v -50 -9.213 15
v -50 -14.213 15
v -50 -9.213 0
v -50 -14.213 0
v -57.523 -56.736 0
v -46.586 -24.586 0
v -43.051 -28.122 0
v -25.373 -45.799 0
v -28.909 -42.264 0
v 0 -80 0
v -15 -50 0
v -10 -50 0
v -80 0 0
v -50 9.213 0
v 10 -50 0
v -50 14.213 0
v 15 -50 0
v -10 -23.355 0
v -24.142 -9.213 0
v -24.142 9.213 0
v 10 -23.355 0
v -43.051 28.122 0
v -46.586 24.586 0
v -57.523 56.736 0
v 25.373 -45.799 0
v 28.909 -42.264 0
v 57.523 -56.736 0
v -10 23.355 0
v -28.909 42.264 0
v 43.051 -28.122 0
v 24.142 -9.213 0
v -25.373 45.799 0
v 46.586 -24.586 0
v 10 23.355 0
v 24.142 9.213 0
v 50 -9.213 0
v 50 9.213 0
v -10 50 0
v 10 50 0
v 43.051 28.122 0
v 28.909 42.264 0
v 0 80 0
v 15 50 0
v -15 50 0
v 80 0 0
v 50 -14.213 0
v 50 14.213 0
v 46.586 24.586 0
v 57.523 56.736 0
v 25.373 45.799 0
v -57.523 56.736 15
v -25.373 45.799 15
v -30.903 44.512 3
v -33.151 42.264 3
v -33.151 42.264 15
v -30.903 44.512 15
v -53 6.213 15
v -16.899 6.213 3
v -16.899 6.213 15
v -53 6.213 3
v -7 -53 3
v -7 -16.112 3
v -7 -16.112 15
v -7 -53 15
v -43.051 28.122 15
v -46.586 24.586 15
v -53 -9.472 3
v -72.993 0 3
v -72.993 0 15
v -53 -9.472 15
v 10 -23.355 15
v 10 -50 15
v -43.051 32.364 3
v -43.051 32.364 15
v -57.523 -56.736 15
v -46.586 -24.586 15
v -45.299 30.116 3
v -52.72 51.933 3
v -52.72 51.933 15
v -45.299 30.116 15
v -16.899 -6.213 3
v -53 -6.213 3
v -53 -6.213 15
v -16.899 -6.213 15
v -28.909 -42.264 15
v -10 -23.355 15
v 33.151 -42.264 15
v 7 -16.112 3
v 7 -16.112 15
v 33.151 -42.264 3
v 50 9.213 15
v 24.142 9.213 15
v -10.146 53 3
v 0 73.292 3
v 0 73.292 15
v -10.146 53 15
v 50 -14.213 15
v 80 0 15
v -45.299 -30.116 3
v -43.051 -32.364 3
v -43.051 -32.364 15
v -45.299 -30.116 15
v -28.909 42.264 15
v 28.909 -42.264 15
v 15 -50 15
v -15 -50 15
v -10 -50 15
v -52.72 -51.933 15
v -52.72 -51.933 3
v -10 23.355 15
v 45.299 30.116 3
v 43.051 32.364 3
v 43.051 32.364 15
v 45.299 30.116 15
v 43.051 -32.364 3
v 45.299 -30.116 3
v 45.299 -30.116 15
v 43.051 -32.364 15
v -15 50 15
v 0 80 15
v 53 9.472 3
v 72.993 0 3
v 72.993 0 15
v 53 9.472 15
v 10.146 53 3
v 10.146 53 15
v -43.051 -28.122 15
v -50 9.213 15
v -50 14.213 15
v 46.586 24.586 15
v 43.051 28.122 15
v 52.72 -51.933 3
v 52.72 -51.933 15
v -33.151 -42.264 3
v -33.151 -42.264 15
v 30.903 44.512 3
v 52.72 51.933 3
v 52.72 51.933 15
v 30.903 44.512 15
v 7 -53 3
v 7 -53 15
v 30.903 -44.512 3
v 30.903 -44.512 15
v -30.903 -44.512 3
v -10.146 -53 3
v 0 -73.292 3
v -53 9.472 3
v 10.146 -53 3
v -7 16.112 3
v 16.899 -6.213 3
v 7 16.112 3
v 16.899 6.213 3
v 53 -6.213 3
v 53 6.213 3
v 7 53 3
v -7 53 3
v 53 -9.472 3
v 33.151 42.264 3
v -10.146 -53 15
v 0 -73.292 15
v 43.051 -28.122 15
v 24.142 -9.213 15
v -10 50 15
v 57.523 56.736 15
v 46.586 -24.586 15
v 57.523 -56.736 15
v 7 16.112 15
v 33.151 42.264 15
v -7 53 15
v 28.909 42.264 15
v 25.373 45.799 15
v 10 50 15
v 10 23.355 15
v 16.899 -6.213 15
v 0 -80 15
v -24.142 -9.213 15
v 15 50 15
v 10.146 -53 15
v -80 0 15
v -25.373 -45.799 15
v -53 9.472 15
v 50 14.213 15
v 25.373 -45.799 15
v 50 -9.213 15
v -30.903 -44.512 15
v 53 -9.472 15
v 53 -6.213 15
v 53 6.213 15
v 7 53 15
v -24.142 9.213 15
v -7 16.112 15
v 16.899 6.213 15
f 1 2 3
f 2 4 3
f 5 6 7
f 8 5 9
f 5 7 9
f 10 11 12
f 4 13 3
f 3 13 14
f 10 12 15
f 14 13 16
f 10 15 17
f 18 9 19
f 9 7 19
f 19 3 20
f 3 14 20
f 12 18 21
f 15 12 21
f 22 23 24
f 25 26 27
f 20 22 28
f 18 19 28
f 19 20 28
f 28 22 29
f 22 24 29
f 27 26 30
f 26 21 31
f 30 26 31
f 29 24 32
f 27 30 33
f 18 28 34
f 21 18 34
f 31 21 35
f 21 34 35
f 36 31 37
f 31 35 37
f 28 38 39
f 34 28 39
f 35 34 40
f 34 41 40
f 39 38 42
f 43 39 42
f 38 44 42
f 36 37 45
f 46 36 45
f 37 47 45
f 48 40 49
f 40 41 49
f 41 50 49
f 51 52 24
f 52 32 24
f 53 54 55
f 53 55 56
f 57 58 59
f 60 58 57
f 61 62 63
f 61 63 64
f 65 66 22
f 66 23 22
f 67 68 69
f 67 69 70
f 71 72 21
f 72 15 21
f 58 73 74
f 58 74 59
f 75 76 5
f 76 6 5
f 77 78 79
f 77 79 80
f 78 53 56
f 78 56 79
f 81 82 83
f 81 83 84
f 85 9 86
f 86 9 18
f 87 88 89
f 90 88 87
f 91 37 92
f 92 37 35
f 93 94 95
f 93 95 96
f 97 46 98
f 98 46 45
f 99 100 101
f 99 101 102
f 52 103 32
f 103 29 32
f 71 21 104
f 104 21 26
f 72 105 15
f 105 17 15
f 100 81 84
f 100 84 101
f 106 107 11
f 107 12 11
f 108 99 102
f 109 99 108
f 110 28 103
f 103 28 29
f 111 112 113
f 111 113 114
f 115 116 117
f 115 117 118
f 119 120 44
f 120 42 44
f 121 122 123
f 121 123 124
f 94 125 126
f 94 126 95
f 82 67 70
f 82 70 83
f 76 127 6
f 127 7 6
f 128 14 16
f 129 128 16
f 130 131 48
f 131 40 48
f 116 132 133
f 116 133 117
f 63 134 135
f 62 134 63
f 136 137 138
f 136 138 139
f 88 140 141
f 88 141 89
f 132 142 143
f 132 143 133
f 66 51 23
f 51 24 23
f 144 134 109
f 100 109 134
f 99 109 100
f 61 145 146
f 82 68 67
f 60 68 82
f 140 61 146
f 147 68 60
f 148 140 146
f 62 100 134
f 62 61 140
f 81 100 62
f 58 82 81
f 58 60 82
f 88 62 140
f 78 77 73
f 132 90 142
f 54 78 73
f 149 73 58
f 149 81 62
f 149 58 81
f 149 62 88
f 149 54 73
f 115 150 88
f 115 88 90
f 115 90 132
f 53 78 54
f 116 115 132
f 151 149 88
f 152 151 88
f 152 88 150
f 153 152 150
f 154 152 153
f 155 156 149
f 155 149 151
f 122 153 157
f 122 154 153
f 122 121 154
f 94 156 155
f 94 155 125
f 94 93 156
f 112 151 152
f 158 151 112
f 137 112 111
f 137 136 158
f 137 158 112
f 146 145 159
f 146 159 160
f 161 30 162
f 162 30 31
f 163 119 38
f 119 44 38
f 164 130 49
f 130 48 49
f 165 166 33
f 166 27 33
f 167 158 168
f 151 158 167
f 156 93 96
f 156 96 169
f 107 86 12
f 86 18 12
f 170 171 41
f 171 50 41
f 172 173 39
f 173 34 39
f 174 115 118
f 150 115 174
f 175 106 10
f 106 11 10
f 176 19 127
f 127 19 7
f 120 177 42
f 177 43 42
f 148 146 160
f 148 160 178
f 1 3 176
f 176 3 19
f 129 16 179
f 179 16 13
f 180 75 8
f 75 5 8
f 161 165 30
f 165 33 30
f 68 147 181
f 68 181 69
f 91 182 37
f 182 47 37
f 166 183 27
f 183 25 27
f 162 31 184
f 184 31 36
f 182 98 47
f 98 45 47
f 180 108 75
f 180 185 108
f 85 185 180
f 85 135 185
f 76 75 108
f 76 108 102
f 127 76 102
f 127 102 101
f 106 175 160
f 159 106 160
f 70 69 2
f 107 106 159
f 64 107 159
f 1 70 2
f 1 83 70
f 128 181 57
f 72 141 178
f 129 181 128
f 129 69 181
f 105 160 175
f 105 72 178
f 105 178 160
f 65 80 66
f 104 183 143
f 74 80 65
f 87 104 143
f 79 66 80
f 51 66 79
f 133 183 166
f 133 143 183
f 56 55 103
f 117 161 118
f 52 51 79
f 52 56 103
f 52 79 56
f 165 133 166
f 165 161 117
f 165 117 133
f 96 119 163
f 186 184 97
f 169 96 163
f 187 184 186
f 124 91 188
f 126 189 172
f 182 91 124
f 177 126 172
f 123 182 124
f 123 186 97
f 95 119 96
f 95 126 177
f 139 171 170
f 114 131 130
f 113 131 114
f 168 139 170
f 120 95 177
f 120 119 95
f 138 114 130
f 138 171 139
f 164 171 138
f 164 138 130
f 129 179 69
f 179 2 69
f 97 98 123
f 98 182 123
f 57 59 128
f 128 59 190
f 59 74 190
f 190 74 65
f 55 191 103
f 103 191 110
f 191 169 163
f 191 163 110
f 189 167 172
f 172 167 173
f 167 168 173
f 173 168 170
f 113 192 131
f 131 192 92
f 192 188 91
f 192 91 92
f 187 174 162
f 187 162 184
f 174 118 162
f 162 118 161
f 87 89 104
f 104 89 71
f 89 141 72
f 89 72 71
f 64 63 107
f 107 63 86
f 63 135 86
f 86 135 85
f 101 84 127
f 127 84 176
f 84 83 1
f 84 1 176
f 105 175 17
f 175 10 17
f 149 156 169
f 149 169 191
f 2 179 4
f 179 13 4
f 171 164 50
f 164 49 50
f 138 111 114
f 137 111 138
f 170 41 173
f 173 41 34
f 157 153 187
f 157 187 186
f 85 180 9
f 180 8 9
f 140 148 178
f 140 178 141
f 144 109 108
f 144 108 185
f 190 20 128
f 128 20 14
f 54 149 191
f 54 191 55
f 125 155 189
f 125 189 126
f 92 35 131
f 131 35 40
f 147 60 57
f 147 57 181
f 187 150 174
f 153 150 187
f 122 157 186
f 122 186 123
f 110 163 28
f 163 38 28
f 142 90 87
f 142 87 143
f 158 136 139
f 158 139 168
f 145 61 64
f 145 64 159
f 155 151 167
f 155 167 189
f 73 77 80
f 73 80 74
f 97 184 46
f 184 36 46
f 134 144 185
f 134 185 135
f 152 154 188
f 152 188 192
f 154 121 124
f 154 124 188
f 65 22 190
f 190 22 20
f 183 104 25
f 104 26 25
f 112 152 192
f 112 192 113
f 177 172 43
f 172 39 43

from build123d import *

# Parameters (mm, degrees)
F1_DEPTH = 10
F2_DEPTH = 5
F3_T     = -3


with BuildPart() as f1:
    # F0 (on Top) → F1 (new body)
    with BuildSketch(Plane.XY):
        Polygon((-24.1421356237, 9.2129365882), (-50, 9.2129365882), (-50, 14.2129365882), (-80, 0), (-50, 0), (0, 0), (0, 50), (0, 80), (-15, 50), (-10, 50), (-10, 23.3550722119), (-10, 9.2129365882), align=None)
        Polygon((-43.0507218531, 28.1215228176), (-24.1421356237, 9.2129365882), (-10, 9.2129365882), (-35.9796540413, 35.1925906294), align=None)
        Polygon((-35.9796540413, 35.1925906294), (-10, 9.2129365882), (-10, 23.3550722119), (-28.9085862294, 42.2636584413), align=None)
        Polygon((-46.5862557591, 24.5859889116), (-43.0507218531, 28.1215228176), (-35.9796540413, 35.1925906294), (-57.5228781318, 56.73581472), align=None)
        Polygon((-50, 0), (-80, 0), (-50, -14.2129365882), (-50, -9.2129365882), (-24.1421356237, -9.2129365882), (-10, -9.2129365882), (-10, -23.3550722119), (-10, -50), (-15, -50), (0, -80), (0, -50), (0, 0), align=None)
        Polygon((-57.5228781318, 56.73581472), (-35.9796540413, 35.1925906294), (-28.9085862294, 42.2636584413), (-25.3730523235, 45.7991923472), align=None)
        Polygon((0, 50), (0, 0), (50, 0), (80, 0), (50, 14.2129365882), (50, 9.2129365882), (24.1421356237, 9.2129365882), (10, 9.2129365882), (10, 23.3550722119), (10, 50), (15, 50), (0, 80), align=None)
        Polygon((50, 0), (0, 0), (0, -50), (0, -80), (15, -50), (10, -50), (10, -23.3550722119), (10, -9.2129365882), (24.1421356237, -9.2129365882), (50, -9.2129365882), (50, -14.2129365882), (80, 0), align=None)
        Polygon((-10, -9.2129365882), (-24.1421356237, -9.2129365882), (-43.0507218531, -28.1215228176), (-35.9796540413, -35.1925906294), align=None)
        Polygon((-10, -23.3550722119), (-10, -9.2129365882), (-35.9796540413, -35.1925906294), (-28.9085862294, -42.2636584413), align=None)
        Polygon((-35.9796540413, -35.1925906294), (-43.0507218531, -28.1215228176), (-46.5862557591, -24.5859889116), (-57.5228781318, -56.73581472), align=None)
        Polygon((-28.9085862294, -42.2636584413), (-35.9796540413, -35.1925906294), (-57.5228781318, -56.73581472), (-25.3730523235, -45.7991923472), align=None)
        Polygon((28.9085862294, 42.2636584413), (10, 23.3550722119), (10, 9.2129365882), (35.9796540413, 35.1925906294), align=None)
        Polygon((10, 9.2129365882), (24.1421356237, 9.2129365882), (43.0507218531, 28.1215228176), (35.9796540413, 35.1925906294), align=None)
        Polygon((43.0507218531, -28.1215228176), (24.1421356237, -9.2129365882), (10, -9.2129365882), (35.9796540413, -35.1925906294), align=None)
        Polygon((10, -9.2129365882), (10, -23.3550722119), (28.9085862294, -42.2636584413), (35.9796540413, -35.1925906294), align=None)
        Polygon((25.3730523235, 45.7991923472), (28.9085862294, 42.2636584413), (35.9796540413, 35.1925906294), (57.5228781318, 56.73581472), align=None)
        Polygon((35.9796540413, 35.1925906294), (43.0507218531, 28.1215228176), (46.5862557591, 24.5859889116), (57.5228781318, 56.73581472), align=None)
        Polygon((46.5862557591, -24.5859889116), (43.0507218531, -28.1215228176), (35.9796540413, -35.1925906294), (57.5228781318, -56.73581472), align=None)
        Polygon((35.9796540413, -35.1925906294), (28.9085862294, -42.2636584413), (25.3730523235, -45.7991923472), (57.5228781318, -56.73581472), align=None)
    extrude(amount=F1_DEPTH)

    # F2 (add): a face of the model
    f2_faces = [f1.faces().sort_by_distance(p)[0] for p in [
        (0, 0, 10),
    ]]
    extrude(f2_faces, amount=F2_DEPTH)

    # F3
    f3_openings = [f1.faces().sort_by_distance(p)[0] for p in [
        (0, 0, 15),
    ]]
    offset(amount=F3_T, openings=f3_openings, kind=Kind.INTERSECTION)


solid = f1.part
